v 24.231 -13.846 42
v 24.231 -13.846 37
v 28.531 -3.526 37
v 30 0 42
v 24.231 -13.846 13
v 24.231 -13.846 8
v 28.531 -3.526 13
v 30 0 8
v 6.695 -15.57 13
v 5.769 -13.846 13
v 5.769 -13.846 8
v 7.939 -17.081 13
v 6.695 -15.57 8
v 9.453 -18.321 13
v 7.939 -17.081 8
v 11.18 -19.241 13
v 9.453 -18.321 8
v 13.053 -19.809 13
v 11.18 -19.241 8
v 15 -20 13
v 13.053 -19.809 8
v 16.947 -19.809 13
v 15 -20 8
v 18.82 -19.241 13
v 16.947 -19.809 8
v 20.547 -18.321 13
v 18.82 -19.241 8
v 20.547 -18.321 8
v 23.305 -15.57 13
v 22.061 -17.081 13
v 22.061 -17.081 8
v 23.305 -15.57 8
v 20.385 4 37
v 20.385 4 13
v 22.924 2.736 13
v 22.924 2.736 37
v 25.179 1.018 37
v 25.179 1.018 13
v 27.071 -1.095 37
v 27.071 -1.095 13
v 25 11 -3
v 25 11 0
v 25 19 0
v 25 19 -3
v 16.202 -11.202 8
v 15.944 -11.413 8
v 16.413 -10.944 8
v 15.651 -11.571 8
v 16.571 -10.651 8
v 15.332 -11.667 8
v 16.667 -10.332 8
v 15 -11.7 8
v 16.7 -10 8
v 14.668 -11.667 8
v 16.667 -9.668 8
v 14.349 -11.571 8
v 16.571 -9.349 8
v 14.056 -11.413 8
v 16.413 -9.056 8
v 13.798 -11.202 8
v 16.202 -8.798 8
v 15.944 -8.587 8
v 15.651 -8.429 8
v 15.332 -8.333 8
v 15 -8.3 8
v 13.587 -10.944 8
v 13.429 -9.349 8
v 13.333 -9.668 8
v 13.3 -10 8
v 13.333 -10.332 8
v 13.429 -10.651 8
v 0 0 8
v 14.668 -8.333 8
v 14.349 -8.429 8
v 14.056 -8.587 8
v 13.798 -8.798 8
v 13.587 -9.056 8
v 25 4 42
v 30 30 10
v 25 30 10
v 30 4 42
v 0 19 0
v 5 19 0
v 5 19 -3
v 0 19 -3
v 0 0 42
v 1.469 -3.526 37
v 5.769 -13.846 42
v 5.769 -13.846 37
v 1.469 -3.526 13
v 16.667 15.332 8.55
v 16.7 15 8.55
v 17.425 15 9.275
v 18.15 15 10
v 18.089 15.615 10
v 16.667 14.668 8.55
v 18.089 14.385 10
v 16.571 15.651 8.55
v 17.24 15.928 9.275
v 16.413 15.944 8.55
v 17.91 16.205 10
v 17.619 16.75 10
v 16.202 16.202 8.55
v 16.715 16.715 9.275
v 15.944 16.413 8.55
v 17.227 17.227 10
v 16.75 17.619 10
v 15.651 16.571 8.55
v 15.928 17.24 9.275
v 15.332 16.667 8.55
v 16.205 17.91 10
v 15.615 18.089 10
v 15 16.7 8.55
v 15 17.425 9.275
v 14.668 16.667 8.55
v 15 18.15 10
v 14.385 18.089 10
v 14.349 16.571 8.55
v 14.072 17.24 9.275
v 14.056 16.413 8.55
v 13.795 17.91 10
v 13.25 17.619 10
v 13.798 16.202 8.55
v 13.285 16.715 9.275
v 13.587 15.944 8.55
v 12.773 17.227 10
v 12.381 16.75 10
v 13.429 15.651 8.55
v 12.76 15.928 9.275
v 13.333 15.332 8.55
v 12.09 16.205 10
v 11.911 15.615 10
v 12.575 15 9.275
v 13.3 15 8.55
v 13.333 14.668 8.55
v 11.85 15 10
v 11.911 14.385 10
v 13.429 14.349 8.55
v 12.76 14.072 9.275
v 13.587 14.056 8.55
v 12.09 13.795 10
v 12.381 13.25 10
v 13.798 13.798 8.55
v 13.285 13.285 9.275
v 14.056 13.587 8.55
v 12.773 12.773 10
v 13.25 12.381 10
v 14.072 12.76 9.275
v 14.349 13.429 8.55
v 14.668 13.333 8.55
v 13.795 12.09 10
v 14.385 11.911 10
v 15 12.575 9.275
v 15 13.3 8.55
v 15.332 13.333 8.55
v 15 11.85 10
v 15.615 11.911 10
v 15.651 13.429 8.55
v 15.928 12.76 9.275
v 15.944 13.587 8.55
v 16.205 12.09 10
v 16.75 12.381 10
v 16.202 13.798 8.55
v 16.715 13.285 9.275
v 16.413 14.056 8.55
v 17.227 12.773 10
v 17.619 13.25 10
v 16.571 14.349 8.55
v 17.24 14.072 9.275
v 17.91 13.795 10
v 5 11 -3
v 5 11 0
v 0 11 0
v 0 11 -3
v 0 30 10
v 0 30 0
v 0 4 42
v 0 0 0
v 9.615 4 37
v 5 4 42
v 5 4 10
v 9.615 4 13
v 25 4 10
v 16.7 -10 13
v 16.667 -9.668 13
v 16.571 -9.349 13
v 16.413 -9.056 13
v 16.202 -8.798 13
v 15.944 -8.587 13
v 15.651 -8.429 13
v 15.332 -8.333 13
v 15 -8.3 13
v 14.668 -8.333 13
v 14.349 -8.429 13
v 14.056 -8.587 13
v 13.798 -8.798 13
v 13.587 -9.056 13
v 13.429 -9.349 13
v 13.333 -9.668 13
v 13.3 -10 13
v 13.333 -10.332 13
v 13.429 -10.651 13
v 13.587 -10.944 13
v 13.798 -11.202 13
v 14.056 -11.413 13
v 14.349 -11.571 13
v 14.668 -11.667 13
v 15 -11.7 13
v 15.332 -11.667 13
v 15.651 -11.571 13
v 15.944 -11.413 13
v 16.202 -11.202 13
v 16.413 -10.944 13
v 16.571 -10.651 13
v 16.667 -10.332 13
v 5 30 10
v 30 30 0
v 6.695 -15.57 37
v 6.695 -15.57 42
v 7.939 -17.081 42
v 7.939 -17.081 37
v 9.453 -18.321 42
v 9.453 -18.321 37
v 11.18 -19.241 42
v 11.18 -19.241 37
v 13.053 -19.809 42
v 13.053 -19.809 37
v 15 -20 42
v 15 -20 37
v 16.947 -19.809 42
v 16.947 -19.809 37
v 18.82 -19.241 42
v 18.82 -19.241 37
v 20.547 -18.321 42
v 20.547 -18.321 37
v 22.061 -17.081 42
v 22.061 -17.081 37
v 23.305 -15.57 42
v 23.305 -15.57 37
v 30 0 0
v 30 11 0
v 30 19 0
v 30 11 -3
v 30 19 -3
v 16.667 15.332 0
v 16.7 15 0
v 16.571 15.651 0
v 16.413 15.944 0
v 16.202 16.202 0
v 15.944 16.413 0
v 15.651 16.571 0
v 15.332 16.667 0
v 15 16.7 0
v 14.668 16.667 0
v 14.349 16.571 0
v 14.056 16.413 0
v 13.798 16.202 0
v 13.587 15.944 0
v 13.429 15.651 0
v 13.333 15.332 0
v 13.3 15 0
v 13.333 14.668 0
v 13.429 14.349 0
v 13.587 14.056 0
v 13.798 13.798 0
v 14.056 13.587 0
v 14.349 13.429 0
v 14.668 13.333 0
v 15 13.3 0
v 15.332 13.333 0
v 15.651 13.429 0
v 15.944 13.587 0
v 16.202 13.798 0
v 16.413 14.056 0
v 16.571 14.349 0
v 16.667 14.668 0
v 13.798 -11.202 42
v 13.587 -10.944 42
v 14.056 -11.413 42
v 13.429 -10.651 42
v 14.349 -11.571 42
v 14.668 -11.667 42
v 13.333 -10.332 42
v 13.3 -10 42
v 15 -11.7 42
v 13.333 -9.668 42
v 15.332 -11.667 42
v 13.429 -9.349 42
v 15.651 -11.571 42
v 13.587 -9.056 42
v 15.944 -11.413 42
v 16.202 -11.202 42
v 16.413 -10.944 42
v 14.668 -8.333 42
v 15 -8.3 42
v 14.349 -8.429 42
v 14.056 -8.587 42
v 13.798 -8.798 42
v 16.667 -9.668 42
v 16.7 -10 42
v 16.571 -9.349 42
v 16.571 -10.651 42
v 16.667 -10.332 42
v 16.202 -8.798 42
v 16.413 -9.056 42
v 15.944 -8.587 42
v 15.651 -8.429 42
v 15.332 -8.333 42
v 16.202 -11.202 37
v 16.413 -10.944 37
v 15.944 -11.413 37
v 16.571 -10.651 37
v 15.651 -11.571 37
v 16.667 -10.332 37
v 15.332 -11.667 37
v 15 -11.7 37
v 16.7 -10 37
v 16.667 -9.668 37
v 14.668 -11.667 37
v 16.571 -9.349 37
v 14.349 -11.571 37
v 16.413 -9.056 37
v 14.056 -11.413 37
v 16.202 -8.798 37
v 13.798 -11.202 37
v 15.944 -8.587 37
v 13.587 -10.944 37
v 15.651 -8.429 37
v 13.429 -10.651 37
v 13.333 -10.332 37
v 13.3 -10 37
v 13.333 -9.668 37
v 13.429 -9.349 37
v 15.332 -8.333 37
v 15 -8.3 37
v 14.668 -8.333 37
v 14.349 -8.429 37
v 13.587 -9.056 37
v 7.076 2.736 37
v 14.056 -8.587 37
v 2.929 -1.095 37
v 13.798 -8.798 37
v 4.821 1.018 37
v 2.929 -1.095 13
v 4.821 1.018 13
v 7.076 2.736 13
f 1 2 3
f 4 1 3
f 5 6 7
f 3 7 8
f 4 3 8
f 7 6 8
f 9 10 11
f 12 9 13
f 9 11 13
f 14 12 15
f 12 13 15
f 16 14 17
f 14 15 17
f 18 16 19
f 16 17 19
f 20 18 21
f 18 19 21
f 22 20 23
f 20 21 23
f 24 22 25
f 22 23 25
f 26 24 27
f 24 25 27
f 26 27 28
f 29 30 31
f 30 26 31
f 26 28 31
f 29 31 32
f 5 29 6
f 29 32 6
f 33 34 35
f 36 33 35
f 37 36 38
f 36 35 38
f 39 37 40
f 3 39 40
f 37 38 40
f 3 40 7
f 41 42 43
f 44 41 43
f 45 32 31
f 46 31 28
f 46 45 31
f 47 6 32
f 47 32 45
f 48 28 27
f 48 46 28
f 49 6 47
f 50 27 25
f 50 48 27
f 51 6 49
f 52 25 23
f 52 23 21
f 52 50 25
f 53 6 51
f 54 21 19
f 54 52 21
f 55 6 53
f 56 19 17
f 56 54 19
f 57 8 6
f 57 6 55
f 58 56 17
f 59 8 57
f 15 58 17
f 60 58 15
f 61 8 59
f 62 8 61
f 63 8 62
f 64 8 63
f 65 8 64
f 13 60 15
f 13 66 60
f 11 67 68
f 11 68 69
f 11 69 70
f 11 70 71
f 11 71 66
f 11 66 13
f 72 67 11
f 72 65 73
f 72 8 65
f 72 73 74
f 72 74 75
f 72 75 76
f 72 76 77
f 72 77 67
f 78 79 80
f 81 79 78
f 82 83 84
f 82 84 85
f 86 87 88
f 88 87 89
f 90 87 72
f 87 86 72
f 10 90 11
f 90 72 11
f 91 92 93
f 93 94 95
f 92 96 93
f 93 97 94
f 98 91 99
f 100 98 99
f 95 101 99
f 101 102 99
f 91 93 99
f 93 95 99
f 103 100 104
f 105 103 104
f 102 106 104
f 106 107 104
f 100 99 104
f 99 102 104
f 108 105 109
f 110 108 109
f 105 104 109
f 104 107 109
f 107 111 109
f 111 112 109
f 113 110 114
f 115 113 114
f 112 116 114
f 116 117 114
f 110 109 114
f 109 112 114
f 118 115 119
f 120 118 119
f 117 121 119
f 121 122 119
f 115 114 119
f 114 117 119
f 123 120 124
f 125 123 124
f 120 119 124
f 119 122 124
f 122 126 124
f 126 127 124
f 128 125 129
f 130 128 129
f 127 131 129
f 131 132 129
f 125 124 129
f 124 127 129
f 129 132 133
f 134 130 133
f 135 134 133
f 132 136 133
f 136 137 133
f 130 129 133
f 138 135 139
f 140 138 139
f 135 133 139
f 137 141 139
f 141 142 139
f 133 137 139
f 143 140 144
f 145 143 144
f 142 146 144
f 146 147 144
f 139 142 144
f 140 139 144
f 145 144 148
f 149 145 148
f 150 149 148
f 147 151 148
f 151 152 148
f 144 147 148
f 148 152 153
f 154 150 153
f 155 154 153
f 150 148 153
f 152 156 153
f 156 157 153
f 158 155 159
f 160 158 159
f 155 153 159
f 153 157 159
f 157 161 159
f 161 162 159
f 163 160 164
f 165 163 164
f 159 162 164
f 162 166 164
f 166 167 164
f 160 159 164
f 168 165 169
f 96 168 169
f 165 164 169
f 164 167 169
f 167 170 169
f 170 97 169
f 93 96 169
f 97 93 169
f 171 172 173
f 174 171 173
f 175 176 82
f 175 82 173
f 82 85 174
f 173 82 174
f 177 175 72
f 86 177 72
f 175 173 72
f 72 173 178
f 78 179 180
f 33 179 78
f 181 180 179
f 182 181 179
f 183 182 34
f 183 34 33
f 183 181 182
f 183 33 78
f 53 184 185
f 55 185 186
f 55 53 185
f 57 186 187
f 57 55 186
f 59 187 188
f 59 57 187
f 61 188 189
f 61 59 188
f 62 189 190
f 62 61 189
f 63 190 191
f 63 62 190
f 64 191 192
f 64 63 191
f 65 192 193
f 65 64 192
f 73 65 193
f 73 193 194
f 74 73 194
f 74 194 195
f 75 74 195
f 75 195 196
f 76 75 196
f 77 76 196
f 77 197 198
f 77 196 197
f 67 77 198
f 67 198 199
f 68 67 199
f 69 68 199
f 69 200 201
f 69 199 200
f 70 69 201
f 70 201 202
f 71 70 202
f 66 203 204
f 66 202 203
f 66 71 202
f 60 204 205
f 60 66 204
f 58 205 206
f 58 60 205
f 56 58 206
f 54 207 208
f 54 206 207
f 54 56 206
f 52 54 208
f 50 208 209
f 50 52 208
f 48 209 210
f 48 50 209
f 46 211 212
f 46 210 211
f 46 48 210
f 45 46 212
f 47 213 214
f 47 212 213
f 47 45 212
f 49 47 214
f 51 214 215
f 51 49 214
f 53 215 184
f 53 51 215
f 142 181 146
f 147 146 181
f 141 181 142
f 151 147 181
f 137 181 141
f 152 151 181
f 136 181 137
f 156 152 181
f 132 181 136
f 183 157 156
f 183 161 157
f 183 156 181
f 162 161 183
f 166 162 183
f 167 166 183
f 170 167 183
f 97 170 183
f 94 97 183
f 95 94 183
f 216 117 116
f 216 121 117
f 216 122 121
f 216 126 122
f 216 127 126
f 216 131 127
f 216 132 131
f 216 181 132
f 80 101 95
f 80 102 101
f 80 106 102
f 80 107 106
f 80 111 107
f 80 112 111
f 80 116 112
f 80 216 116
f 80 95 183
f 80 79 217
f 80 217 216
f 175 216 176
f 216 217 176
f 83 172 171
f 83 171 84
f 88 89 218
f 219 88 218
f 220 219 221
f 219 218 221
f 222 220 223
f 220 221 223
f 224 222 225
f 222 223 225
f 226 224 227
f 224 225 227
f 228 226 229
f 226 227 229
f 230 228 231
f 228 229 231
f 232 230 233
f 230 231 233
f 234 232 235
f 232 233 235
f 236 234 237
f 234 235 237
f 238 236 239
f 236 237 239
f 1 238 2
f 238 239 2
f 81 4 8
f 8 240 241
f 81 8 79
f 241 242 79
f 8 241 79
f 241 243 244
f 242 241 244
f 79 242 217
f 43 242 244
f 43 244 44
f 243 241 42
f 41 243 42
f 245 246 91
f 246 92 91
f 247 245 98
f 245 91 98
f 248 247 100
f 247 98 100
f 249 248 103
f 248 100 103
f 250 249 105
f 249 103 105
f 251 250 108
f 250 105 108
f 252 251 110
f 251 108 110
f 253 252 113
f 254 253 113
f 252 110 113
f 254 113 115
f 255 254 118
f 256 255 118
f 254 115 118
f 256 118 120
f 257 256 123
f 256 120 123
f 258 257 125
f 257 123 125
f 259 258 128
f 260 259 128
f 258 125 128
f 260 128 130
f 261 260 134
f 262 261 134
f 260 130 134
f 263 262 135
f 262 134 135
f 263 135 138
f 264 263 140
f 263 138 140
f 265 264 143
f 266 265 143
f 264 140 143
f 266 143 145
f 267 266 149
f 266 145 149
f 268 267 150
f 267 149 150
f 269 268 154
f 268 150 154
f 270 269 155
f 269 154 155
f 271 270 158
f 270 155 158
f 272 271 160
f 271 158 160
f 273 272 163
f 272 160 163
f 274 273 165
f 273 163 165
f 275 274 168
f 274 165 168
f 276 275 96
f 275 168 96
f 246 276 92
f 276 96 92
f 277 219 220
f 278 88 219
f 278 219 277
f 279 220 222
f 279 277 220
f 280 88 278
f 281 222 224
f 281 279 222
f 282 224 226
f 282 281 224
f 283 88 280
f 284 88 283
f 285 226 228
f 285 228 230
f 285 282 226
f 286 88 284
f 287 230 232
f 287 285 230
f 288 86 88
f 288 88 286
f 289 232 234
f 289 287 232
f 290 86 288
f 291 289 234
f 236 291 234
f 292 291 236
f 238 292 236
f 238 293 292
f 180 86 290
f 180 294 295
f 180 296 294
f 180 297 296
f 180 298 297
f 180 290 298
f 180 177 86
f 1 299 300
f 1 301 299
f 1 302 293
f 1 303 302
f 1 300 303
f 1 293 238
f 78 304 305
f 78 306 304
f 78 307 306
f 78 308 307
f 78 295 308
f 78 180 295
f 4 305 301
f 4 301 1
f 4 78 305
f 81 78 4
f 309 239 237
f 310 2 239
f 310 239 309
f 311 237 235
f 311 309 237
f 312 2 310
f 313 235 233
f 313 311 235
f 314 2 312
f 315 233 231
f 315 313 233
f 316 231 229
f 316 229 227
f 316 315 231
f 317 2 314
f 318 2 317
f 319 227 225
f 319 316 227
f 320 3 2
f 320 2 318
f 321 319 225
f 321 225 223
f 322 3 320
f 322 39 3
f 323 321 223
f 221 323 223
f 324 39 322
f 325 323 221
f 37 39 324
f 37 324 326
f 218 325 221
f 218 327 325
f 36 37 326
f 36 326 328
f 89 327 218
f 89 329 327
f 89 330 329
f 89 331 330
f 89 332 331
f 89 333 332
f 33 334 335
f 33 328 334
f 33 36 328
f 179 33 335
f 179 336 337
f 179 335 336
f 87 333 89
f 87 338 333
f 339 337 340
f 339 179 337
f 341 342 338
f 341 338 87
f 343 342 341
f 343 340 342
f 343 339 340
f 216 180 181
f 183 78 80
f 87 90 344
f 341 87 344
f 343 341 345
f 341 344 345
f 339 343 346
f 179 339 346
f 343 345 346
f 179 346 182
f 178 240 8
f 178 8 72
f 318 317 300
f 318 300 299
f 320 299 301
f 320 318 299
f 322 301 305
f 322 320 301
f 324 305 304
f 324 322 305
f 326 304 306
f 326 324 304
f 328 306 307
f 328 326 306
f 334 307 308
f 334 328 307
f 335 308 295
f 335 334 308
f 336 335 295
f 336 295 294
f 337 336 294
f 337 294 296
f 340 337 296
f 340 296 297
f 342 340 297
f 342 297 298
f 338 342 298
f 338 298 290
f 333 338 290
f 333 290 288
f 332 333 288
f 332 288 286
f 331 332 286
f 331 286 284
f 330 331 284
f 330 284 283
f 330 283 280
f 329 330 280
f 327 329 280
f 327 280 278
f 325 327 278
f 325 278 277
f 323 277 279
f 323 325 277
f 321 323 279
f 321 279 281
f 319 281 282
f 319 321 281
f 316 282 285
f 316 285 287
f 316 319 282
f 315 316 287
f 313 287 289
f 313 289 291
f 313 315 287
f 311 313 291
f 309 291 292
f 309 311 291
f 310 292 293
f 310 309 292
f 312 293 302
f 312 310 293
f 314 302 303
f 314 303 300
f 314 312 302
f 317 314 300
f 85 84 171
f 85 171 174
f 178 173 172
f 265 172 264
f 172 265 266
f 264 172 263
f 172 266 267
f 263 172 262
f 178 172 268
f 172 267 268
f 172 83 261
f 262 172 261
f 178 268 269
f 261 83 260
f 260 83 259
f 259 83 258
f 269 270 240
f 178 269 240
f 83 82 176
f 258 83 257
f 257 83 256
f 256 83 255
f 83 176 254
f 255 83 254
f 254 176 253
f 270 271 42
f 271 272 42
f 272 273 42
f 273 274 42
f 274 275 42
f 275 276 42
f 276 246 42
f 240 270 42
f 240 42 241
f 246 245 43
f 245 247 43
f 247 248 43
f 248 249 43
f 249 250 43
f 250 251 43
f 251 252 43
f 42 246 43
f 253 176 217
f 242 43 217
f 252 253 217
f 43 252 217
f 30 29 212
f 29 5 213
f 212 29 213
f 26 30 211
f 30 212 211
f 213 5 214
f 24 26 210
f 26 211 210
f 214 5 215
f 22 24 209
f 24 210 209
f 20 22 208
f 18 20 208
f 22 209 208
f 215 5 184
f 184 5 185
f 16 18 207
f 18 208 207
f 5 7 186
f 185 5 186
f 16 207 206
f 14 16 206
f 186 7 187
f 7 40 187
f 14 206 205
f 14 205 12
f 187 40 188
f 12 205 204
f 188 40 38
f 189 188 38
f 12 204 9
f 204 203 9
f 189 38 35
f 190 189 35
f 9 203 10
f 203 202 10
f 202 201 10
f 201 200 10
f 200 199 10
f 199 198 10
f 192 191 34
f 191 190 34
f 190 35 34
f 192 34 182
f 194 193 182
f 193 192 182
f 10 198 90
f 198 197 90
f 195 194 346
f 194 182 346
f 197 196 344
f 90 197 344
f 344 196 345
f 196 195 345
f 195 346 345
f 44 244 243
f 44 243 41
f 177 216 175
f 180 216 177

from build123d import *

# Parameters (mm, degrees)
EXTRUDE_1_DEPTH     = 42
SKETCH_2_R          = 15
CUT_EXTRUDE_1_DEPTH = 12
SKETCH_3_W          = 30
SKETCH_3_H          = 20
CUT_EXTRUDE_2_DEPTH = 8
SKETCH_4_W          = 5
SKETCH_4_H          = 8
EXTRUDE_2_DEPTH     = 3
OTHER_START         = 8
OTHER_1_OUTLINE_R   = 1.7
OTHER_1_DEPTH       = 34
SKETCH_7_W          = 20
SKETCH_7_H          = 32
CUT_EXTRUDE_6_DEPTH = 26
CUT_EXTRUDE_7_DEPTH = 60.699246226


# Read off the part's stored shape, not the designer's step: 高级异型孔1, 高级异型孔2
with BuildPart() as part:
    # 草图1 → 凸台-拉伸1 (new body)
    with BuildSketch(Plane.XY):
        with BuildLine():
            Line((0, 0), (5.769230769, -13.846153846))
            ThreePointArc((5.769230769, -13.846153846), (15, -20), (24.230769231, -13.846153846))
            Line((24.230769231, -13.846153846), (30, 0))
            Line((30, 0), (30, 30))
            Line((30, 30), (0, 30))
            Line((0, 30), (0, 0))
        make_face()
    extrude(amount=EXTRUDE_1_DEPTH)

    # 草图2 → 切除-拉伸1 (cut, symmetric)
    with BuildSketch(Plane(origin=(0, 0, 25), x_dir=(-1, 0, 0), z_dir=(0, 0, -1))):
        with Locations((-15, -10)):
            Circle(SKETCH_2_R)
    extrude(amount=CUT_EXTRUDE_1_DEPTH, both=True, mode=Mode.SUBTRACT)

    # 草图3 → 切除-拉伸2 (cut)
    with BuildSketch(Plane(origin=(0, 0, 0), x_dir=(-1, 0, 0), z_dir=(0, 0, -1))):
        with Locations((-15, -10)):
            Rectangle(SKETCH_3_W, SKETCH_3_H)
    extrude(amount=-CUT_EXTRUDE_2_DEPTH, mode=Mode.SUBTRACT)

    # 草图4 → 凸台-拉伸2 (add)
    with BuildSketch(Plane(origin=(0, 0, 0), x_dir=(-1, 0, 0), z_dir=(0, 0, -1))):
        with Locations((-27.5, 15)):
            Rectangle(SKETCH_4_W, SKETCH_4_H)
        with Locations((-2.5, 15)):
            Rectangle(SKETCH_4_W, SKETCH_4_H)
    extrude(amount=EXTRUDE_2_DEPTH)

    # 高级异型孔1 outline → 高级异型孔1 (cut)
    with BuildSketch(Plane.XY.offset(OTHER_START)):
        with Locations((15, -10)):
            Circle(OTHER_1_OUTLINE_R)
    extrude(amount=OTHER_1_DEPTH, mode=Mode.SUBTRACT)

    # 草图7 → 切除-拉伸6 (cut)
    with BuildSketch(Plane(origin=(0, 30, 0), x_dir=(1, 0, 0), z_dir=(0, 1, 0))):
        with Locations((15, -26)):
            Rectangle(SKETCH_7_W, SKETCH_7_H)
    extrude(amount=-CUT_EXTRUDE_6_DEPTH, mode=Mode.SUBTRACT)

    # 草图8 → 切除-拉伸7 (cut, through all)
    with BuildSketch(Plane(origin=(30, 0, 0), x_dir=(0, 0, -1), z_dir=(1, 0, 0))):
        Polygon((-42, 30), (-10, 30), (-42, 4), align=None)
    extrude(amount=-CUT_EXTRUDE_7_DEPTH, mode=Mode.SUBTRACT)

    # 高级异型孔2 outline → 高级异型孔2 (revolve, cut)
    with BuildSketch(Plane(origin=(15, 15, 0), x_dir=(1, 0, 0), z_dir=(0, -1, 0))):
        Polygon((0, 0), (1.7, 0), (1.7, 8.55), (3.15, 10), (0, 10), align=None)
    revolve(axis=Axis((15, 15, 0), (0, 0, 1)), mode=Mode.SUBTRACT)


solid = part.part
